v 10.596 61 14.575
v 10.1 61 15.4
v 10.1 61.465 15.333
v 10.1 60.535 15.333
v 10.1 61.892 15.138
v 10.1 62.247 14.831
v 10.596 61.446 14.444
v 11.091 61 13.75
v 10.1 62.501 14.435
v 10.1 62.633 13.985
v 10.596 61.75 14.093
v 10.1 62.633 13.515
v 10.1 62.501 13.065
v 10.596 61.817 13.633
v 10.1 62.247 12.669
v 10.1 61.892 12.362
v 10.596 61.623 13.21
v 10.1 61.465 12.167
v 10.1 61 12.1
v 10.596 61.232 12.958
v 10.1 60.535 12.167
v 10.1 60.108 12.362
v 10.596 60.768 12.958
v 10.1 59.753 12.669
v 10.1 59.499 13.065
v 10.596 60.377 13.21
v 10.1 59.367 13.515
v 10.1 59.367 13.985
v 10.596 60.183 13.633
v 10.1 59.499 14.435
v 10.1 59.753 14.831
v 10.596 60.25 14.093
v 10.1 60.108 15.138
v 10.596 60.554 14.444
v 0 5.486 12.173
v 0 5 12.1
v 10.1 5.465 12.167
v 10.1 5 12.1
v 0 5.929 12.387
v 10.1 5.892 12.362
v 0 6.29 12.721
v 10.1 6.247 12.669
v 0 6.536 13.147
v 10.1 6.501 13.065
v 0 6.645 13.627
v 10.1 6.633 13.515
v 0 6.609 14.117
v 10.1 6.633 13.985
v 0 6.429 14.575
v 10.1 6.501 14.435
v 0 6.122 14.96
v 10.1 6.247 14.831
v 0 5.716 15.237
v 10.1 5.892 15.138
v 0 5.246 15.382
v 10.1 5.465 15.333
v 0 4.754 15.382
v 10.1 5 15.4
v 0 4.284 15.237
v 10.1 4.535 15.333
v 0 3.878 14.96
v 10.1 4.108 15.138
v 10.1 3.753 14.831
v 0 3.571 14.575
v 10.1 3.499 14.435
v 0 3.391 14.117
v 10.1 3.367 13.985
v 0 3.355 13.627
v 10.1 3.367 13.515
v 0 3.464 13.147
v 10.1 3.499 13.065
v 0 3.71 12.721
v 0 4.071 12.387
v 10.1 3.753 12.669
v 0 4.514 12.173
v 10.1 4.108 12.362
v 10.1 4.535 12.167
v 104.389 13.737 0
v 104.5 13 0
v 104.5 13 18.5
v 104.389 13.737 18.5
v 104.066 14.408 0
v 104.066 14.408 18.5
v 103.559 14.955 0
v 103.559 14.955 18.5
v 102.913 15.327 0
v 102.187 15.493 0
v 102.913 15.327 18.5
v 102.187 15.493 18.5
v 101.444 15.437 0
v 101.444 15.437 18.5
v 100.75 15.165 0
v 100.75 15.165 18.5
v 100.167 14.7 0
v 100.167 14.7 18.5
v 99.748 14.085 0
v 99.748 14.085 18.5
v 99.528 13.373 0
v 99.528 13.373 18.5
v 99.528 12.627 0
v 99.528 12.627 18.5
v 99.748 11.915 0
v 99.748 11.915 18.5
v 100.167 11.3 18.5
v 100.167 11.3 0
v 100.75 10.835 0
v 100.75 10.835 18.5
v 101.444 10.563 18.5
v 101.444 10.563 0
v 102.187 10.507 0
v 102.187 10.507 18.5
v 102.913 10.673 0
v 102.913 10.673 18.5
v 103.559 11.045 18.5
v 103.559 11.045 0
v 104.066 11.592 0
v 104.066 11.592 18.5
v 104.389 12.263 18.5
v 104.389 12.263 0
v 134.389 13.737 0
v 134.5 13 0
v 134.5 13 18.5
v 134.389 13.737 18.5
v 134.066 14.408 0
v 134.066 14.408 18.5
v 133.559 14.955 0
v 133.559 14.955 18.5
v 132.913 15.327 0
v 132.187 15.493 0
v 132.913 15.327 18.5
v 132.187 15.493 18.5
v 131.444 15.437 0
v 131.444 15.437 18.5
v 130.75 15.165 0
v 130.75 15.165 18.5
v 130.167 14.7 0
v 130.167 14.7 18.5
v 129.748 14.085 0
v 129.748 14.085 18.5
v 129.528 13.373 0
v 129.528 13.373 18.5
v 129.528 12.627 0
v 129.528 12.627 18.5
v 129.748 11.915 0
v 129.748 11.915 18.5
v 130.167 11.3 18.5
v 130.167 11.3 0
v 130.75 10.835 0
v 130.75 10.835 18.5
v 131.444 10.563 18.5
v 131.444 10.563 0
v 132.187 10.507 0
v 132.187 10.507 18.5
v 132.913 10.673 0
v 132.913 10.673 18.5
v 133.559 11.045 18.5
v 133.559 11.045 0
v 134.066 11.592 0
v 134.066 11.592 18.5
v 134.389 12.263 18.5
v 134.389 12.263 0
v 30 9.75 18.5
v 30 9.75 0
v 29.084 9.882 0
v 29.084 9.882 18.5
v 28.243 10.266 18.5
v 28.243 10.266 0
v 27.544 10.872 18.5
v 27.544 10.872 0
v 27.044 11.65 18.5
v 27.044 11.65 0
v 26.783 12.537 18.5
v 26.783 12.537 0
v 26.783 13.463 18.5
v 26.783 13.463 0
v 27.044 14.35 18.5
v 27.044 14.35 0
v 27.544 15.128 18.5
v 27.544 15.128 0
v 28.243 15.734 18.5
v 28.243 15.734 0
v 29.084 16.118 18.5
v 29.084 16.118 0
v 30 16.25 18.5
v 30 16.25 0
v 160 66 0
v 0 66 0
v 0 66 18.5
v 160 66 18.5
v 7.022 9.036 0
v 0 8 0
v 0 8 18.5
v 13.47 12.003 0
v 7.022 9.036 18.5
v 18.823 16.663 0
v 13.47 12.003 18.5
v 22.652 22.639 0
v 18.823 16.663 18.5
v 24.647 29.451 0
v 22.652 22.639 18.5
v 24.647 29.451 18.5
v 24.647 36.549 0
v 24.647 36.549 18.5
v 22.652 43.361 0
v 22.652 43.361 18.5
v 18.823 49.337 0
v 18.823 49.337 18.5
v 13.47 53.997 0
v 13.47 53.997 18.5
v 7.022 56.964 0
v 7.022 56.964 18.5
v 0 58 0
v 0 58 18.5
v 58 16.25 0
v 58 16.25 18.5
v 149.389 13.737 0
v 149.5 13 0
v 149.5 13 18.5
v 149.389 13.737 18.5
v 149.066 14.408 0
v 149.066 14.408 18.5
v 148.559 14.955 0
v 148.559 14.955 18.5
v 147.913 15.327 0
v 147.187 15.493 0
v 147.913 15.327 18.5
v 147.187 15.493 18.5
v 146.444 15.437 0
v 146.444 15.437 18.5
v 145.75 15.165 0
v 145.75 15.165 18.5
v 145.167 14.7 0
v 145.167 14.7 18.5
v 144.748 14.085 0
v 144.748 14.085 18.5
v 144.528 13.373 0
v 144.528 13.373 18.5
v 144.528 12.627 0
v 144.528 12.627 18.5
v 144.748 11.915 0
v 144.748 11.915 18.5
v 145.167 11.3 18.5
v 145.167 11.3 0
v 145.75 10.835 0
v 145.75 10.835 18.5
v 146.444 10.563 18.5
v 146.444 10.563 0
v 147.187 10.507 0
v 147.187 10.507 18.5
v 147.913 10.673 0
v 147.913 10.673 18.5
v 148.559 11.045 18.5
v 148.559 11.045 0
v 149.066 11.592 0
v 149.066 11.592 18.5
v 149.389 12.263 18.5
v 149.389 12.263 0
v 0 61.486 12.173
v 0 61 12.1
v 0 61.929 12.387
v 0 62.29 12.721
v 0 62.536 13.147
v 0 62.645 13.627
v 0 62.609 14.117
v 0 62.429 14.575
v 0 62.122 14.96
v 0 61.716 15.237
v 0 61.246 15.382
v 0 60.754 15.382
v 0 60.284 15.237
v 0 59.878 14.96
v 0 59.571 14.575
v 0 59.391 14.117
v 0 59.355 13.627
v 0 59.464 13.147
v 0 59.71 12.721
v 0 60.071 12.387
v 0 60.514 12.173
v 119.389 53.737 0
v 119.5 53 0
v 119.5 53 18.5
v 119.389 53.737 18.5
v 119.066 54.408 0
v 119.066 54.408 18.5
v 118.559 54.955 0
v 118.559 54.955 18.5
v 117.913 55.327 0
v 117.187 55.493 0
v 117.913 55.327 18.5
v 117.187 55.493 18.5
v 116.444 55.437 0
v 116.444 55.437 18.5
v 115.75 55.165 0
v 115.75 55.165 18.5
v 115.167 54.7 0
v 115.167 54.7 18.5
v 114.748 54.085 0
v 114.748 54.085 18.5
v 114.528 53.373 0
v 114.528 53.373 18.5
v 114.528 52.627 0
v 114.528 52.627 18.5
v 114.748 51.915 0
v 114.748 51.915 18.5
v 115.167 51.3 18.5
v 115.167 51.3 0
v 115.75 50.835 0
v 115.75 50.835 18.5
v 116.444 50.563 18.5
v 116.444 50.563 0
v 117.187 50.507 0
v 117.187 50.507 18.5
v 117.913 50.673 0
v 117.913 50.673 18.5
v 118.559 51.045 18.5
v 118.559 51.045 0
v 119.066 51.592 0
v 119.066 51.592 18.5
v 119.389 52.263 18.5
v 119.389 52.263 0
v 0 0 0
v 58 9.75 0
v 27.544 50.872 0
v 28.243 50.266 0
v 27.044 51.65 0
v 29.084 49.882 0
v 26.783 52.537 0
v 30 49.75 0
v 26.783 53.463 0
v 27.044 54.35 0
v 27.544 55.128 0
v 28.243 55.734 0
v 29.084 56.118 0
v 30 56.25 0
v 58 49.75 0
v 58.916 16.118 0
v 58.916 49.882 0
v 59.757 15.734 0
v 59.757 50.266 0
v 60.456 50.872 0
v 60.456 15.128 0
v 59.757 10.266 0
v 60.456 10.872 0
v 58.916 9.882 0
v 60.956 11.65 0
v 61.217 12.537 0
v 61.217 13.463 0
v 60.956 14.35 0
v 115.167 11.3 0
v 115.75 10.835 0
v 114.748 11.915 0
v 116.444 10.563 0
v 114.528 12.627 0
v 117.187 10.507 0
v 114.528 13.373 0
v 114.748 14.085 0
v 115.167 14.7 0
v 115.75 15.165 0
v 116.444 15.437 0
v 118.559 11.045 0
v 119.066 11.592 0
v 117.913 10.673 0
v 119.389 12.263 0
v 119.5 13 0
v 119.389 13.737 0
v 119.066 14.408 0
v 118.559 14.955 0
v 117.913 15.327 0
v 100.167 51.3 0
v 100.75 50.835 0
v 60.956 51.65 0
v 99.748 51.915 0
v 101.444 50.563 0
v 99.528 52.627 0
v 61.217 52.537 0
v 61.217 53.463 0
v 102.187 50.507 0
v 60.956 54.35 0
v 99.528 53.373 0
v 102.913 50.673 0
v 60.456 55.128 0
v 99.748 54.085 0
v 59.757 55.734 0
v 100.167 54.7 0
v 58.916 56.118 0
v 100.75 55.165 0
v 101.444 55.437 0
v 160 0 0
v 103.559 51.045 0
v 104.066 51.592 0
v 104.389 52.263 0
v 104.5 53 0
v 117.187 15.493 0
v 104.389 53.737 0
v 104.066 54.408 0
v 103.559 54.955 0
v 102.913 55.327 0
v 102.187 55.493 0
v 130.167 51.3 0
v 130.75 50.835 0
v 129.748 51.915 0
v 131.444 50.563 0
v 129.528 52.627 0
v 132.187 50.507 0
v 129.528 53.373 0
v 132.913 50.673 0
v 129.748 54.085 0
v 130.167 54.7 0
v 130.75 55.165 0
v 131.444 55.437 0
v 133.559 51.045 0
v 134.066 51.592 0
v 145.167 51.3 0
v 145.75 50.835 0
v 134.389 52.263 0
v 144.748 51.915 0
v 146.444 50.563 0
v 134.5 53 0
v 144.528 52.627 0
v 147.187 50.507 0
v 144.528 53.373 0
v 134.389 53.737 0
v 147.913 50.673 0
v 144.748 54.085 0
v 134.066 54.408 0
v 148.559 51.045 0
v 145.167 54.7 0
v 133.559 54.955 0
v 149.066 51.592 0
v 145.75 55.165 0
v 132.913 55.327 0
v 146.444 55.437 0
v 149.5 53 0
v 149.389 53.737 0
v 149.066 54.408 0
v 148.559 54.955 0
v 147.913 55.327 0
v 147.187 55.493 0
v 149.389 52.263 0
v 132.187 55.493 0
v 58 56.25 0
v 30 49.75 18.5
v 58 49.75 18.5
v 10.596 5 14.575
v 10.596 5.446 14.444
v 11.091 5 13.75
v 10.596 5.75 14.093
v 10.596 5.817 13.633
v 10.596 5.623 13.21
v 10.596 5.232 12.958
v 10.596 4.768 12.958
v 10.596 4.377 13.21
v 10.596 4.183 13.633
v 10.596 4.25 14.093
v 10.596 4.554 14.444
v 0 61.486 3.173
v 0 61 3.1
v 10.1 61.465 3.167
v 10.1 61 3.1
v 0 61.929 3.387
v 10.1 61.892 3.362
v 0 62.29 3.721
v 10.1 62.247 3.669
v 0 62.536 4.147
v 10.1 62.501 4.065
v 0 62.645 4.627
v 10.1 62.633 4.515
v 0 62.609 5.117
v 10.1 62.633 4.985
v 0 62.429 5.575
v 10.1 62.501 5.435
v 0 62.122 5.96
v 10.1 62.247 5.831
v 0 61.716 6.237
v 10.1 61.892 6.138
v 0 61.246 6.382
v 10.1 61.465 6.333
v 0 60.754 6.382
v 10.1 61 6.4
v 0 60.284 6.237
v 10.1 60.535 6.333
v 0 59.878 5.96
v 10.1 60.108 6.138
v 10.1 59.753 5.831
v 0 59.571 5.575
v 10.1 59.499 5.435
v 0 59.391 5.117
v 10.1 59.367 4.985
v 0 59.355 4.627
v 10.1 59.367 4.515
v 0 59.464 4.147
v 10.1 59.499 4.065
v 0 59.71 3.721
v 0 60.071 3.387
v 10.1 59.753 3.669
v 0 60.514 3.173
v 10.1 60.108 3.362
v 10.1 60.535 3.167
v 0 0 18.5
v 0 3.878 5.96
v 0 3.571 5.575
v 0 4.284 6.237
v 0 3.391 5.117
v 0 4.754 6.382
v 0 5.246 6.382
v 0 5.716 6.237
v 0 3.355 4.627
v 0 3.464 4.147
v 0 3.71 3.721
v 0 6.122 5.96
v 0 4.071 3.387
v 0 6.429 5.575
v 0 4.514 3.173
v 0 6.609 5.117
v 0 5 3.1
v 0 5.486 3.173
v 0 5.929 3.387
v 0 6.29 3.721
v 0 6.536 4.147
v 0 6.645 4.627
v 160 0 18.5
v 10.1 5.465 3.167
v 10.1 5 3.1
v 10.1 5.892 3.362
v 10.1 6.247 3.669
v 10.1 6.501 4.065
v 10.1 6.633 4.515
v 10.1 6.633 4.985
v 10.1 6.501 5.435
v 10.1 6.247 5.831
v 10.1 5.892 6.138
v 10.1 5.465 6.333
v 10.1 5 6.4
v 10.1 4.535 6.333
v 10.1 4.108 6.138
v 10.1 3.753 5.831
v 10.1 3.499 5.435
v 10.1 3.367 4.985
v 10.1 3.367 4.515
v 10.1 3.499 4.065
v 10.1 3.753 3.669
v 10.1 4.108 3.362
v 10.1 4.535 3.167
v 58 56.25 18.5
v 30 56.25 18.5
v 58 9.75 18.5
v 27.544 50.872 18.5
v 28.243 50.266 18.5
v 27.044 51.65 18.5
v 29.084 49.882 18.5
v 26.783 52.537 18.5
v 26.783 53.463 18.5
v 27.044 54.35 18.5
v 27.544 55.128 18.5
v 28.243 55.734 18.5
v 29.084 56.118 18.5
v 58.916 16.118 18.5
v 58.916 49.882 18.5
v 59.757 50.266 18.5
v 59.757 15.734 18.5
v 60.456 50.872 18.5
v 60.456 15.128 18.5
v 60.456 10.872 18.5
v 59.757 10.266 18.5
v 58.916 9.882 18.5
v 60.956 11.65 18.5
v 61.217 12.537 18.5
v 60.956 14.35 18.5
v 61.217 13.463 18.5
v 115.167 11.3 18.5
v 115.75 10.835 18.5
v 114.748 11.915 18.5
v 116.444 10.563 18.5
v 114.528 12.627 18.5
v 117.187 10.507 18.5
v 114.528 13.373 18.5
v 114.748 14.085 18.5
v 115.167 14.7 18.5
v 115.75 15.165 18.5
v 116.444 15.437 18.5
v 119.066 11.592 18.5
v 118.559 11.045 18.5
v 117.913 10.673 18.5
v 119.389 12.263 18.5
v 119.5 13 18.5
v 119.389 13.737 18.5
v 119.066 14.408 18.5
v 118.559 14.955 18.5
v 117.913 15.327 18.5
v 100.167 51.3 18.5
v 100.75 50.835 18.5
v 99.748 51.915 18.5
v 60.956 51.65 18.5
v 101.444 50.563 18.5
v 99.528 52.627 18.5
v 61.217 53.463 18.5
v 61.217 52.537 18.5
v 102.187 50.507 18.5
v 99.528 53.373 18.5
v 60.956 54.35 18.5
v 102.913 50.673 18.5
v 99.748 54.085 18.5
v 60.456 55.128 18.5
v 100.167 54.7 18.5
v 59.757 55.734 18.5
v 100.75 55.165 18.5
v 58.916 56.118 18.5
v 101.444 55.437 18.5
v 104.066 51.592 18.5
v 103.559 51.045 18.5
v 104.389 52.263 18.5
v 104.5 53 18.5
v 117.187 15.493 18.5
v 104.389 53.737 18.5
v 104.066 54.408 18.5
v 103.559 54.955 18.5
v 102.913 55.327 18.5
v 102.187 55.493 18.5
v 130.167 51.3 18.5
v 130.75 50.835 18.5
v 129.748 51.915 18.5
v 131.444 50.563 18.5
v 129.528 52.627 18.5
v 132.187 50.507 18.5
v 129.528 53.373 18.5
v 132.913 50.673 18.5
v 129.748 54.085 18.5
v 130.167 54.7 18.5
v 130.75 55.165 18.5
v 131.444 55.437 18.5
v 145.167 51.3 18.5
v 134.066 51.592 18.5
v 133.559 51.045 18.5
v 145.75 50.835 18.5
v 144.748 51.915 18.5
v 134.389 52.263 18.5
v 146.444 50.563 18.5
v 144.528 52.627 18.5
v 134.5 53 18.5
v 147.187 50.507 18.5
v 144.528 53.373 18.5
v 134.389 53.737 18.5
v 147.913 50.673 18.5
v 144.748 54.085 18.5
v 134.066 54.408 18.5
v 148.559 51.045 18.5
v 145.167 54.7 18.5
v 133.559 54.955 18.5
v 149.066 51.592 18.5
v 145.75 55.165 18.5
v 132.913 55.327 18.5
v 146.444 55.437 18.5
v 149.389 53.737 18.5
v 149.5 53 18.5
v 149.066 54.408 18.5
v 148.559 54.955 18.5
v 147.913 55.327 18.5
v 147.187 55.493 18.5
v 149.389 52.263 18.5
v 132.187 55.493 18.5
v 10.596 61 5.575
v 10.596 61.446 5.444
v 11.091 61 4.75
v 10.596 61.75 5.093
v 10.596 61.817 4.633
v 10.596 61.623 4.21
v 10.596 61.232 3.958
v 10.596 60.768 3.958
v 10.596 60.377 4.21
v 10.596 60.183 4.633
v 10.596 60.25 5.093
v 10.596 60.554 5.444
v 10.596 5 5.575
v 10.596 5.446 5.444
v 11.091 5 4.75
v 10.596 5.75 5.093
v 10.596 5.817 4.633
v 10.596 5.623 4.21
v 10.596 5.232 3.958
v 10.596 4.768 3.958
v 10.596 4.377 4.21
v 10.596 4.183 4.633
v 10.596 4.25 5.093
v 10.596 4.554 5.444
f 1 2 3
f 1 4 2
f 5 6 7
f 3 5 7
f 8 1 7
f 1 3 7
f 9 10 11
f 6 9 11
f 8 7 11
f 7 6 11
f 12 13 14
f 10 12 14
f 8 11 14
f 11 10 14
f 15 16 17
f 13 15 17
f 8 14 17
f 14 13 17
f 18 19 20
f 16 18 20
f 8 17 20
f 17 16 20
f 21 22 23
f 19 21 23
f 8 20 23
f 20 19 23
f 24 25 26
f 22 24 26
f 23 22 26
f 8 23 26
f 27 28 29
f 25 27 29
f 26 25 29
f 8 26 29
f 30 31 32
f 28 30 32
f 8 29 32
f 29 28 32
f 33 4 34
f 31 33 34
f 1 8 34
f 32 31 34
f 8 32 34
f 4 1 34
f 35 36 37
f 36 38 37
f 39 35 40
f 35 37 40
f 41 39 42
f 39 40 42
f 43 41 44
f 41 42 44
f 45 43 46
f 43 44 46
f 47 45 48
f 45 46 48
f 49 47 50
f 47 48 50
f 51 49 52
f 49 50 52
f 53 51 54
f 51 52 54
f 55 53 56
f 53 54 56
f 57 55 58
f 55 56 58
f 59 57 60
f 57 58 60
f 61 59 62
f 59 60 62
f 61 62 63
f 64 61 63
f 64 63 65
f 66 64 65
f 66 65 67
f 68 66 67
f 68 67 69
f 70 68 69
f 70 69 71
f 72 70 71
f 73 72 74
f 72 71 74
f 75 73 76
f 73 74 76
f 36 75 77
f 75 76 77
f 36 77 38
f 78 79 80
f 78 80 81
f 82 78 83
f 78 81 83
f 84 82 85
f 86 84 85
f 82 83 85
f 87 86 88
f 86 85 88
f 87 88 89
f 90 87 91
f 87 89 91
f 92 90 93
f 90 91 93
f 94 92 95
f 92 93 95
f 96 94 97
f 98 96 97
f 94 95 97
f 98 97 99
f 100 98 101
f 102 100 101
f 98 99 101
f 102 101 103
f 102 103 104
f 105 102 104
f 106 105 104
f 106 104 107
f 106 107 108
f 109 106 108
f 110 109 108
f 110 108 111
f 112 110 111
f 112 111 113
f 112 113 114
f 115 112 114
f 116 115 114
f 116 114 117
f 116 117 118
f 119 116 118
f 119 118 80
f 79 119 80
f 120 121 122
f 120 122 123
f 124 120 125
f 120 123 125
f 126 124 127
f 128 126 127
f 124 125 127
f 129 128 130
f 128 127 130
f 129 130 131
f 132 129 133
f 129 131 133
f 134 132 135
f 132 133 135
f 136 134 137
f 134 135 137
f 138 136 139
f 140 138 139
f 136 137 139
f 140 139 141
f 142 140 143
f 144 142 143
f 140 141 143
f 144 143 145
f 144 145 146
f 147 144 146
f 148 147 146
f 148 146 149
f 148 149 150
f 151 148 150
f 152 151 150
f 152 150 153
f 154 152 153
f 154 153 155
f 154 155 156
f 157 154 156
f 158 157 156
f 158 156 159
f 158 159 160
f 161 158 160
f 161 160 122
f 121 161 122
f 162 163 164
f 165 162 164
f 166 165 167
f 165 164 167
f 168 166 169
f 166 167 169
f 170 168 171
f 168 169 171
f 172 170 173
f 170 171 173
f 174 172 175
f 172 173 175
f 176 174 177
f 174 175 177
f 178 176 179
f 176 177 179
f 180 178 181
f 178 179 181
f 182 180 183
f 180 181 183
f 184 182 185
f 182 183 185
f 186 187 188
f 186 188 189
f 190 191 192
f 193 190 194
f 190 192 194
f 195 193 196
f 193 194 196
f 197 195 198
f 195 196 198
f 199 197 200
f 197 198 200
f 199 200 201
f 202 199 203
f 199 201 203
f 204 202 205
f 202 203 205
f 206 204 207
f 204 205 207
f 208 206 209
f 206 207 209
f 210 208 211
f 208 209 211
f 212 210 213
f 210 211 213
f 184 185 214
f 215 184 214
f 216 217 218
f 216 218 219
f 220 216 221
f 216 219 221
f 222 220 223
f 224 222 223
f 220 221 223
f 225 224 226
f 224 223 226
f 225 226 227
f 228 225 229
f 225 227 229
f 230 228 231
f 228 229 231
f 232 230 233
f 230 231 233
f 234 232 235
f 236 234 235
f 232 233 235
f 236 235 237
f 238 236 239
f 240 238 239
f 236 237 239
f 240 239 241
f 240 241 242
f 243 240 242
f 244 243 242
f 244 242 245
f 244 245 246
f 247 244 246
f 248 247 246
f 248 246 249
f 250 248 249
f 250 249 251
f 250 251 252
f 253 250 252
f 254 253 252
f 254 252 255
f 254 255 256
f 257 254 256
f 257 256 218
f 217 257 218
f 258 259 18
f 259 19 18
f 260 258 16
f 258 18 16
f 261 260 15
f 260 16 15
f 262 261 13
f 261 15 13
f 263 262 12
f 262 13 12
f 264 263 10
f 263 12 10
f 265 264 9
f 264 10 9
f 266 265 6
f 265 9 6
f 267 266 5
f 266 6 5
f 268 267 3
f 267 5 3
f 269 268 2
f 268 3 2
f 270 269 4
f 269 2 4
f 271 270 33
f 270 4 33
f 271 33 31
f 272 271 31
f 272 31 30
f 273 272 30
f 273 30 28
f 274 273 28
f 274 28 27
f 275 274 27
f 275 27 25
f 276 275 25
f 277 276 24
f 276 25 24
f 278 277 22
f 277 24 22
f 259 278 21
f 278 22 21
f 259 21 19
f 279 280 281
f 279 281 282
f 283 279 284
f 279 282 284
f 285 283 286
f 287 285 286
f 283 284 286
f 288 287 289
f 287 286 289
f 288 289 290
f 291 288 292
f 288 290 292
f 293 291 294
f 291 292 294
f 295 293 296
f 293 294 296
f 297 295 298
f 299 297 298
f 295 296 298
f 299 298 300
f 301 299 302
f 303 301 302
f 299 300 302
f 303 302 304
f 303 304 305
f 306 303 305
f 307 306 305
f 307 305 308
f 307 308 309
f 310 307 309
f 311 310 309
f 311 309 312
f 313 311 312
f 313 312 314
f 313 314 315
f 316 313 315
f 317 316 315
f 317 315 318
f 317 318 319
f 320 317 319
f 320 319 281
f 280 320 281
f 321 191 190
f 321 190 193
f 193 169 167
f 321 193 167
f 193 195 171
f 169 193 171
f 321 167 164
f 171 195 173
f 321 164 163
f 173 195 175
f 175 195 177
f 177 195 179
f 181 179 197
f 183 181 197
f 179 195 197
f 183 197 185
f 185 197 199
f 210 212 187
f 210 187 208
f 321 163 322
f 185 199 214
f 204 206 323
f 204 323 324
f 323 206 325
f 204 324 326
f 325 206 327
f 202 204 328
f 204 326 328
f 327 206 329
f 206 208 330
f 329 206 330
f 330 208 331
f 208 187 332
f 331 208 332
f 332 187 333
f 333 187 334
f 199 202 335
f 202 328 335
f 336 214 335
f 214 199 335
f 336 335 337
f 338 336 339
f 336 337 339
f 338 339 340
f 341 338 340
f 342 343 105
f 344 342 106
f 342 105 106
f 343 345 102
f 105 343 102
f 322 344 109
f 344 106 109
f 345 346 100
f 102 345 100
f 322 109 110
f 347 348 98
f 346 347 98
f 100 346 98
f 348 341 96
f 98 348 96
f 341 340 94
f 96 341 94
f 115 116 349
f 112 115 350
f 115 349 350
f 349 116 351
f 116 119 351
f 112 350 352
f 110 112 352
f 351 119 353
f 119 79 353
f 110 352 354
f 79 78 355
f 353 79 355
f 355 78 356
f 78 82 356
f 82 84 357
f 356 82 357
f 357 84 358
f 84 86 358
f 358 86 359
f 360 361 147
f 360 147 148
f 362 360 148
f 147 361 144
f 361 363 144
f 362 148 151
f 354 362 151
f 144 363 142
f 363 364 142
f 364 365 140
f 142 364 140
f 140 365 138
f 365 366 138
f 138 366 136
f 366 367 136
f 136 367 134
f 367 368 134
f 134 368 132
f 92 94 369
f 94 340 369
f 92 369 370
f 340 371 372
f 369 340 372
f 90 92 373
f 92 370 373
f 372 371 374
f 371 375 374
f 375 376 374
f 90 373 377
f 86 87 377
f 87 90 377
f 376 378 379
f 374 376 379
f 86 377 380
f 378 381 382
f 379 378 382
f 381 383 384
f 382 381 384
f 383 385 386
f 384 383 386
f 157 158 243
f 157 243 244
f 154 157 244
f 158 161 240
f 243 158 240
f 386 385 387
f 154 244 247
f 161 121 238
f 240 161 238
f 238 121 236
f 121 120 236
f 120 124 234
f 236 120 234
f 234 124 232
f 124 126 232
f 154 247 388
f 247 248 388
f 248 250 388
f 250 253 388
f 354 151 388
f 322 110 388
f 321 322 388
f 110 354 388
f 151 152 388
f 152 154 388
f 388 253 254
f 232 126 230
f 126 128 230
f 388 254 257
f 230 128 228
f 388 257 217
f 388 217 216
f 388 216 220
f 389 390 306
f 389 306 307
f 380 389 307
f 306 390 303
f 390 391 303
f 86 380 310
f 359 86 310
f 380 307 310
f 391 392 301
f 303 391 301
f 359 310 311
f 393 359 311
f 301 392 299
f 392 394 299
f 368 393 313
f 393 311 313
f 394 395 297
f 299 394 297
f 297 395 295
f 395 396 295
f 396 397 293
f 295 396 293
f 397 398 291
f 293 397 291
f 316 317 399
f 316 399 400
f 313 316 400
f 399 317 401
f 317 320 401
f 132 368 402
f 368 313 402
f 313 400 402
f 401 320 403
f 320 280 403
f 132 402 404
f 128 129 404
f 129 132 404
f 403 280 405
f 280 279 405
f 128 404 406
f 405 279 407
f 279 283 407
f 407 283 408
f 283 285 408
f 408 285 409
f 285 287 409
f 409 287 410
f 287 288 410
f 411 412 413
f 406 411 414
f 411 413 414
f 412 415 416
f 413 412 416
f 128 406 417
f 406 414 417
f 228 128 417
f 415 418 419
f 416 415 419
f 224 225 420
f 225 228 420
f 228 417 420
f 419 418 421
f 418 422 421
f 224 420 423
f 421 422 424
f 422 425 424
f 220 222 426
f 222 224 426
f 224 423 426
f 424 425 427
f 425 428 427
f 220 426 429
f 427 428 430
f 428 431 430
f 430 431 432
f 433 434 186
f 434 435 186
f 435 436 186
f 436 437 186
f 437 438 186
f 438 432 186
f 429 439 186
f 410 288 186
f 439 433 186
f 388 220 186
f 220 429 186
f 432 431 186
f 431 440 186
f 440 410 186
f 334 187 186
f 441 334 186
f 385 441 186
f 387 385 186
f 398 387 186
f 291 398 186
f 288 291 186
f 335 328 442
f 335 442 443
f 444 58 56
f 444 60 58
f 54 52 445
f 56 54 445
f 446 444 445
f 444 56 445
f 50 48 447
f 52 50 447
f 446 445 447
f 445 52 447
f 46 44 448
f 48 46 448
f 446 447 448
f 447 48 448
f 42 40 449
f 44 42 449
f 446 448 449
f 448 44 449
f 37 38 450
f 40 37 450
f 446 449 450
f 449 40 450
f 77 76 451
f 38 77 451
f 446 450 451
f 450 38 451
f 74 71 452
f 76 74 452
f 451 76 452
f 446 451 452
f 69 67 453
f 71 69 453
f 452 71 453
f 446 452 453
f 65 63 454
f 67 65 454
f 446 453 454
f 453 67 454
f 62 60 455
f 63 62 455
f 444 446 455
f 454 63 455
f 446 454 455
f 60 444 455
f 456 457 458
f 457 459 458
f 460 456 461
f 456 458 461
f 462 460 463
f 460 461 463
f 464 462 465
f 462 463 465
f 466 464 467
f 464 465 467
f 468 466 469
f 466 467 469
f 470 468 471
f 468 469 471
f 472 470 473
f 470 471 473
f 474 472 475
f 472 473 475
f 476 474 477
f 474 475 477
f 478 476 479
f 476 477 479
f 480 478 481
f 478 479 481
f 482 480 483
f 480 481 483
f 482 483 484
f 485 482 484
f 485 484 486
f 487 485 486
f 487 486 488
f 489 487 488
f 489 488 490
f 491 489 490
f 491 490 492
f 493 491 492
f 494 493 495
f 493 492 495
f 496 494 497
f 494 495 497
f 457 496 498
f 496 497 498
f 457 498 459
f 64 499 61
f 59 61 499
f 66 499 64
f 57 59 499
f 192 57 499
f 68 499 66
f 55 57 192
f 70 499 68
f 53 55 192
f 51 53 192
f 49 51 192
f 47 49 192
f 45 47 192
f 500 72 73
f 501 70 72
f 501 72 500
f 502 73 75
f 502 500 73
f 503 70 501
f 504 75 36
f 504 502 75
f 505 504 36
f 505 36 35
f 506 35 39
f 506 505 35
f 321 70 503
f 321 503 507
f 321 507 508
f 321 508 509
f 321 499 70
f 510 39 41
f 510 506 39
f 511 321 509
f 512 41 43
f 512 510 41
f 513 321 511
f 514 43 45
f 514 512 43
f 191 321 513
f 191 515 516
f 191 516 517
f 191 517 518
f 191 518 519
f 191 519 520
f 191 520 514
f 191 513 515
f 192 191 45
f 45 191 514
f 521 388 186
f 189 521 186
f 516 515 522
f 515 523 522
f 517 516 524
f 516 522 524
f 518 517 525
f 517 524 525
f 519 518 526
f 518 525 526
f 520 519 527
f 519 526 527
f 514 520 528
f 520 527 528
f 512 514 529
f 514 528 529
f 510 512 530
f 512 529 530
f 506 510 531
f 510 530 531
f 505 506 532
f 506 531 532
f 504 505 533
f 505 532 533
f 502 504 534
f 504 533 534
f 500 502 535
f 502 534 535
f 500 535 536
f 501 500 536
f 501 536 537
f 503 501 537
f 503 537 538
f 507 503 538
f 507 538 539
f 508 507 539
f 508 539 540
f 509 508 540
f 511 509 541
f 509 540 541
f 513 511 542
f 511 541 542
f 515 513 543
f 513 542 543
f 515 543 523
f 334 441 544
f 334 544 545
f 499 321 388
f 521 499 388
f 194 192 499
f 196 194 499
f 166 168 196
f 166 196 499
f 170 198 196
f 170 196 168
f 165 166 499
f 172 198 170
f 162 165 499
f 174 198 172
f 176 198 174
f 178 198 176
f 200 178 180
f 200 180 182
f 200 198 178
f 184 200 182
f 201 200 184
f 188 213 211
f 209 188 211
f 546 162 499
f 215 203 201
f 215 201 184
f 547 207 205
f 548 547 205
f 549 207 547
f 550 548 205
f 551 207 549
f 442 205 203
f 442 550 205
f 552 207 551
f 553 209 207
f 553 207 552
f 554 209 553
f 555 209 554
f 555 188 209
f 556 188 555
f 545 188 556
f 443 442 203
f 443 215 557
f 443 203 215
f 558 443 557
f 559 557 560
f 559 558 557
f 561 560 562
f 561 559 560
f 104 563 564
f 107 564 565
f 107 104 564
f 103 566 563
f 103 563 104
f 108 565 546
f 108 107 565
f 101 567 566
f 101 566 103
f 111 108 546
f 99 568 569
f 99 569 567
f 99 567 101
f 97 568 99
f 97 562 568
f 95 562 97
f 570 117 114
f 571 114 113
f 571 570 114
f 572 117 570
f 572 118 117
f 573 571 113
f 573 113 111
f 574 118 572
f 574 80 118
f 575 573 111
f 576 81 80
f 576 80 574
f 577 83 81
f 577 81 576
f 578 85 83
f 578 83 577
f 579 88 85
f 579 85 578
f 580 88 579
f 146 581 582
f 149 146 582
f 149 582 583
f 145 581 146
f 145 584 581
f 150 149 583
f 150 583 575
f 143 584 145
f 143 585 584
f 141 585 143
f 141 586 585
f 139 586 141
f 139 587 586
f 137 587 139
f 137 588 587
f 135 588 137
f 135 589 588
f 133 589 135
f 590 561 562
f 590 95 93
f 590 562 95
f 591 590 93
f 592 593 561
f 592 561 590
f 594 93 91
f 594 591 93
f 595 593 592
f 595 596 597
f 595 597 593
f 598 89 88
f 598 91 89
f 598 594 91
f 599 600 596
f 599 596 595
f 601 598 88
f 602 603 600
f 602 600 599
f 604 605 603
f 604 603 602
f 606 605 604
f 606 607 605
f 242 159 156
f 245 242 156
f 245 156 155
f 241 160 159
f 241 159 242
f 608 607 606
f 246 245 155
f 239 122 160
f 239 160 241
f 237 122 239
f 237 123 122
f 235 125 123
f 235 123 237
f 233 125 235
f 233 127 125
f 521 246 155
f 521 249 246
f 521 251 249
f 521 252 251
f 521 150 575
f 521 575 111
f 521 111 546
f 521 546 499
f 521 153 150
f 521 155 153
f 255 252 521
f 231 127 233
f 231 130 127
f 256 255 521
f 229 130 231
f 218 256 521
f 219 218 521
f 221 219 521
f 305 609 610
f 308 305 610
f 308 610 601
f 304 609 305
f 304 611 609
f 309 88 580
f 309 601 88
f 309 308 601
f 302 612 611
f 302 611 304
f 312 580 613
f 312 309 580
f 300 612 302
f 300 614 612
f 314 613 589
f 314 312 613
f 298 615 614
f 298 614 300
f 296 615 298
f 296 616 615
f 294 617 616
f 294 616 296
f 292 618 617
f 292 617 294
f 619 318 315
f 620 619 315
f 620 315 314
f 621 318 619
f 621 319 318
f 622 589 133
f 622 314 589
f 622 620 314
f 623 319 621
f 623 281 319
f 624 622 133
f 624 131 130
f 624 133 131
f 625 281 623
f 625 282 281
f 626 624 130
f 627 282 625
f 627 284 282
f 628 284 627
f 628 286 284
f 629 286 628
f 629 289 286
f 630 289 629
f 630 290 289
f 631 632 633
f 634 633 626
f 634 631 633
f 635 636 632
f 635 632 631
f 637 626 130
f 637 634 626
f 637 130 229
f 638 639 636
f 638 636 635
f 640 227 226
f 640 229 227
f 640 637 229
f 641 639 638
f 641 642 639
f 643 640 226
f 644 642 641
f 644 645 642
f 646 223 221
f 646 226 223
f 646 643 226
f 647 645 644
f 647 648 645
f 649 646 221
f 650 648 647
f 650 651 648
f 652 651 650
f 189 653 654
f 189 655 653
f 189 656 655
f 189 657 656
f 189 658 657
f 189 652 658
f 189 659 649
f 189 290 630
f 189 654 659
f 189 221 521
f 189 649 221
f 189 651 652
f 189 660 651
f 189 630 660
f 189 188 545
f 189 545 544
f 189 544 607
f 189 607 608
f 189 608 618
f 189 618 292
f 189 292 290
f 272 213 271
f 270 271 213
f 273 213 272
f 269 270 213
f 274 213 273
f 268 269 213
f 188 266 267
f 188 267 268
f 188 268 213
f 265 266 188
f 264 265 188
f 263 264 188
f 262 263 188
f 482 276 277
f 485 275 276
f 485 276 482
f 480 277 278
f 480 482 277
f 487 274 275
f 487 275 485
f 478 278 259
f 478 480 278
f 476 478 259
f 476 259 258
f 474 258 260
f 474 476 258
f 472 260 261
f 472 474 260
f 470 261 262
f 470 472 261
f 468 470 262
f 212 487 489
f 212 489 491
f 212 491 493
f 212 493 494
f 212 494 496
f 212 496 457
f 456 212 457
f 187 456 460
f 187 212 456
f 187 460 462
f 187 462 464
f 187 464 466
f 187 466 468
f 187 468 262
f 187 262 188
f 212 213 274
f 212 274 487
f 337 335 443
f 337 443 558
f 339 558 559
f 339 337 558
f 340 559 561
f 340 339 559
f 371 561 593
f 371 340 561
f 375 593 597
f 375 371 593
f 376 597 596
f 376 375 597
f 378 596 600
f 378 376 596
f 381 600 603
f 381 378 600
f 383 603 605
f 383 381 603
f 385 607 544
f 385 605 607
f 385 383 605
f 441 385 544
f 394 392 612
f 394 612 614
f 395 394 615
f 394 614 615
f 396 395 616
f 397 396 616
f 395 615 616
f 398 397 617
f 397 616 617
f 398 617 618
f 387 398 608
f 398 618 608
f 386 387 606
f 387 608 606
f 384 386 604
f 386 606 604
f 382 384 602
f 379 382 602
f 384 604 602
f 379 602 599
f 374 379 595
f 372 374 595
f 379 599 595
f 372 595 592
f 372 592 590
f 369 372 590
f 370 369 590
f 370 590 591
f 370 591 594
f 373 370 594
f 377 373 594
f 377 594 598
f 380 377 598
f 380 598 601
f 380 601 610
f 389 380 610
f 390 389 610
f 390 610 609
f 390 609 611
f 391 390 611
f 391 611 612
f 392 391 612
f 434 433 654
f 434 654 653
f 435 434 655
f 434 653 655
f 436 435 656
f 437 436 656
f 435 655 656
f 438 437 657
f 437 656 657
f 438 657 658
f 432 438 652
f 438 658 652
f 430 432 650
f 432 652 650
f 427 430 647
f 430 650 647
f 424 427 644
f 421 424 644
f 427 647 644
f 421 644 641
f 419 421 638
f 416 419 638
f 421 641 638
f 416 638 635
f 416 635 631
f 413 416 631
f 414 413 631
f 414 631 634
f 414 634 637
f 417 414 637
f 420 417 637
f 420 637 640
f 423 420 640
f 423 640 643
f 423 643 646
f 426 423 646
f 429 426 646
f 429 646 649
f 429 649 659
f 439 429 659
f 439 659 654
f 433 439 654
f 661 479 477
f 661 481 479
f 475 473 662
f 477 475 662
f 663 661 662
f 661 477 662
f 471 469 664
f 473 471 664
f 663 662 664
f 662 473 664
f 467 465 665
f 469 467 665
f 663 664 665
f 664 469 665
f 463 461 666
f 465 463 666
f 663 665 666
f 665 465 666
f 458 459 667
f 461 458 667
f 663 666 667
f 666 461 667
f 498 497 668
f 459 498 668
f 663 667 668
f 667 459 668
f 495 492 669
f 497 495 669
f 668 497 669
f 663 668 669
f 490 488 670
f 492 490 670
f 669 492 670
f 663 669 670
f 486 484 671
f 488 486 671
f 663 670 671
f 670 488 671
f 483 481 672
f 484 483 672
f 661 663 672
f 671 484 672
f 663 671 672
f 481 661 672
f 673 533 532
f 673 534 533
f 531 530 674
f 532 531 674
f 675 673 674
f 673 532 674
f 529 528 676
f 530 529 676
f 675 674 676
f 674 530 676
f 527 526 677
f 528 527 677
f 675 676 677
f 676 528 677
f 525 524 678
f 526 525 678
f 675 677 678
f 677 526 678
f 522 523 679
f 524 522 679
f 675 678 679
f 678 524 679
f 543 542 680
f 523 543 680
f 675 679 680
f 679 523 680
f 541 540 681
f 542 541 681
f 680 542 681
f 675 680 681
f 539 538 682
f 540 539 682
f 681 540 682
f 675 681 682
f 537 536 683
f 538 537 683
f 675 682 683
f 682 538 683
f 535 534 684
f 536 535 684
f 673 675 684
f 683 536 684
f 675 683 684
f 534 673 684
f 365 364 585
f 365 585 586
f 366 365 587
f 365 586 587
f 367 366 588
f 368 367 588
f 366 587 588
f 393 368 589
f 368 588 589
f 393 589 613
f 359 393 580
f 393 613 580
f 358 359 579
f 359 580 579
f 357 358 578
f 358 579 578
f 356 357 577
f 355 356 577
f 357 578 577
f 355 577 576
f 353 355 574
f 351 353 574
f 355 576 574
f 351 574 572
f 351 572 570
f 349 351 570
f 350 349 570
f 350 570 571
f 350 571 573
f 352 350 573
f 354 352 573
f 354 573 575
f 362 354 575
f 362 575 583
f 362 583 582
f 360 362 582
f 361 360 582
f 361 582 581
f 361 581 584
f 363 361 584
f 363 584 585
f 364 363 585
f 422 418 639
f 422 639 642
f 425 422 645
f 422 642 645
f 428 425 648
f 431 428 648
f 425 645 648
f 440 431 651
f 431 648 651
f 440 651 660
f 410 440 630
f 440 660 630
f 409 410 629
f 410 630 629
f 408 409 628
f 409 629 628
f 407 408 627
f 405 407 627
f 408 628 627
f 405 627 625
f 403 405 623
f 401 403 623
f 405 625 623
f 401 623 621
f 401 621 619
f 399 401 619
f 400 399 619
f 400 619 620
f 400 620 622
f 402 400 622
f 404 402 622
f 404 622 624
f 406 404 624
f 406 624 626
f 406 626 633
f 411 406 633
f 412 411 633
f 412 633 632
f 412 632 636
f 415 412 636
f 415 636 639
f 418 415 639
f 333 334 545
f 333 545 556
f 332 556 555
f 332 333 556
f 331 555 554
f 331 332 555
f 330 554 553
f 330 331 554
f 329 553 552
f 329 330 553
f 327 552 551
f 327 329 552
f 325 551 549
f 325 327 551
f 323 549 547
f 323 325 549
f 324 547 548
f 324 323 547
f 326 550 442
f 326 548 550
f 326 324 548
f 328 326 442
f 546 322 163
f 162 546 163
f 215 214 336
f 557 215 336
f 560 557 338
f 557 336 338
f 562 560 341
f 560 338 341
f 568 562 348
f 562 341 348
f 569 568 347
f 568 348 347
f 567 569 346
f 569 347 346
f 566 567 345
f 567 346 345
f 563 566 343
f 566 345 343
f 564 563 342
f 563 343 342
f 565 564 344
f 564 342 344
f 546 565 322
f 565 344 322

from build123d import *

# Parameters (mm, degrees)
SKETCH_1_W             = 160
SKETCH_1_H             = 66
EXTRUDE_1_DEPTH        = 18.5
SKETCH_2_R             = 25
CUT_EXTRUDE_1_DEPTH    = 20
HOLE_WIZARD_M6_1_D     = 5
PATTERN_LINEAR_1_COUNT = 4
PATTERN_LINEAR_1_PITCH = 15
CUT_EXTRUDE_4_DEPTH    = 40
HOLE_WIZARD_M4_1_D     = 3.3
HOLE_WIZARD_M4_1_DEPTH = 10.1
HOLE_WIZARD_M4_1_TIP   = 0.991420021


with BuildPart() as part:
    # 草图1 → 凸台-拉伸1 (new body)
    with BuildSketch(Plane.XY):
        with Locations((80, 33)):
            Rectangle(SKETCH_1_W, SKETCH_1_H)
    extrude(amount=EXTRUDE_1_DEPTH)

    # 草图2 → 切除-拉伸1 (cut)
    with BuildSketch(Plane.XY.offset(18.5)):
        with Locations((-0.1, 33)):
            Circle(SKETCH_2_R)
    extrude(amount=-CUT_EXTRUDE_1_DEPTH, mode=Mode.SUBTRACT)

    # M6 螺纹孔1 (through all)
    with Locations(Plane(origin=(0, 0, 0), x_dir=(-1, 0, 0), z_dir=(0, 0, -1))):
        with Locations((-147, 53), (-147, 13)):
            hole_wizard_m6_1 = Hole(HOLE_WIZARD_M6_1_D / 2)

    # 阵列(线性)1: M6 螺纹孔1 ×4
    with Locations(*[(-i * PATTERN_LINEAR_1_PITCH, 0, 0) for i in range(1, PATTERN_LINEAR_1_COUNT)]):
        add(hole_wizard_m6_1, mode=Mode.SUBTRACT)

    # 草图7 → 切除-拉伸4 (cut)
    with BuildSketch(Plane(origin=(0, 0, 0), x_dir=(-1, 0, 0), z_dir=(0, 0, -1))):
        with BuildLine():
            Line((-30, 49.75), (-58, 49.75))
            ThreePointArc((-58, 49.75), (-61.25, 53), (-58, 56.25))
            Line((-58, 56.25), (-30, 56.25))
            ThreePointArc((-30, 56.25), (-26.75, 53), (-30, 49.75))
        make_face()
        with BuildLine():
            Line((-30, 16.25), (-58, 16.25))
            ThreePointArc((-58, 16.25), (-61.25, 13), (-58, 9.75))
            Line((-58, 9.75), (-30, 9.75))
            ThreePointArc((-30, 9.75), (-26.75, 13), (-30, 16.25))
        make_face()
    extrude(amount=-CUT_EXTRUDE_4_DEPTH, mode=Mode.SUBTRACT)

    # M4 螺纹孔1
    with Locations(Plane.ZY):
        with Locations((4.75, 5), (13.75, 5), (4.75, 61), (13.75, 61)):
            Hole(HOLE_WIZARD_M4_1_D / 2, depth=HOLE_WIZARD_M4_1_DEPTH)
            with Locations((0, 0, -(HOLE_WIZARD_M4_1_DEPTH + HOLE_WIZARD_M4_1_TIP / 2))):  # 118° drill point
                Cone(0, HOLE_WIZARD_M4_1_D / 2, HOLE_WIZARD_M4_1_TIP, mode=Mode.SUBTRACT)


solid = part.part
